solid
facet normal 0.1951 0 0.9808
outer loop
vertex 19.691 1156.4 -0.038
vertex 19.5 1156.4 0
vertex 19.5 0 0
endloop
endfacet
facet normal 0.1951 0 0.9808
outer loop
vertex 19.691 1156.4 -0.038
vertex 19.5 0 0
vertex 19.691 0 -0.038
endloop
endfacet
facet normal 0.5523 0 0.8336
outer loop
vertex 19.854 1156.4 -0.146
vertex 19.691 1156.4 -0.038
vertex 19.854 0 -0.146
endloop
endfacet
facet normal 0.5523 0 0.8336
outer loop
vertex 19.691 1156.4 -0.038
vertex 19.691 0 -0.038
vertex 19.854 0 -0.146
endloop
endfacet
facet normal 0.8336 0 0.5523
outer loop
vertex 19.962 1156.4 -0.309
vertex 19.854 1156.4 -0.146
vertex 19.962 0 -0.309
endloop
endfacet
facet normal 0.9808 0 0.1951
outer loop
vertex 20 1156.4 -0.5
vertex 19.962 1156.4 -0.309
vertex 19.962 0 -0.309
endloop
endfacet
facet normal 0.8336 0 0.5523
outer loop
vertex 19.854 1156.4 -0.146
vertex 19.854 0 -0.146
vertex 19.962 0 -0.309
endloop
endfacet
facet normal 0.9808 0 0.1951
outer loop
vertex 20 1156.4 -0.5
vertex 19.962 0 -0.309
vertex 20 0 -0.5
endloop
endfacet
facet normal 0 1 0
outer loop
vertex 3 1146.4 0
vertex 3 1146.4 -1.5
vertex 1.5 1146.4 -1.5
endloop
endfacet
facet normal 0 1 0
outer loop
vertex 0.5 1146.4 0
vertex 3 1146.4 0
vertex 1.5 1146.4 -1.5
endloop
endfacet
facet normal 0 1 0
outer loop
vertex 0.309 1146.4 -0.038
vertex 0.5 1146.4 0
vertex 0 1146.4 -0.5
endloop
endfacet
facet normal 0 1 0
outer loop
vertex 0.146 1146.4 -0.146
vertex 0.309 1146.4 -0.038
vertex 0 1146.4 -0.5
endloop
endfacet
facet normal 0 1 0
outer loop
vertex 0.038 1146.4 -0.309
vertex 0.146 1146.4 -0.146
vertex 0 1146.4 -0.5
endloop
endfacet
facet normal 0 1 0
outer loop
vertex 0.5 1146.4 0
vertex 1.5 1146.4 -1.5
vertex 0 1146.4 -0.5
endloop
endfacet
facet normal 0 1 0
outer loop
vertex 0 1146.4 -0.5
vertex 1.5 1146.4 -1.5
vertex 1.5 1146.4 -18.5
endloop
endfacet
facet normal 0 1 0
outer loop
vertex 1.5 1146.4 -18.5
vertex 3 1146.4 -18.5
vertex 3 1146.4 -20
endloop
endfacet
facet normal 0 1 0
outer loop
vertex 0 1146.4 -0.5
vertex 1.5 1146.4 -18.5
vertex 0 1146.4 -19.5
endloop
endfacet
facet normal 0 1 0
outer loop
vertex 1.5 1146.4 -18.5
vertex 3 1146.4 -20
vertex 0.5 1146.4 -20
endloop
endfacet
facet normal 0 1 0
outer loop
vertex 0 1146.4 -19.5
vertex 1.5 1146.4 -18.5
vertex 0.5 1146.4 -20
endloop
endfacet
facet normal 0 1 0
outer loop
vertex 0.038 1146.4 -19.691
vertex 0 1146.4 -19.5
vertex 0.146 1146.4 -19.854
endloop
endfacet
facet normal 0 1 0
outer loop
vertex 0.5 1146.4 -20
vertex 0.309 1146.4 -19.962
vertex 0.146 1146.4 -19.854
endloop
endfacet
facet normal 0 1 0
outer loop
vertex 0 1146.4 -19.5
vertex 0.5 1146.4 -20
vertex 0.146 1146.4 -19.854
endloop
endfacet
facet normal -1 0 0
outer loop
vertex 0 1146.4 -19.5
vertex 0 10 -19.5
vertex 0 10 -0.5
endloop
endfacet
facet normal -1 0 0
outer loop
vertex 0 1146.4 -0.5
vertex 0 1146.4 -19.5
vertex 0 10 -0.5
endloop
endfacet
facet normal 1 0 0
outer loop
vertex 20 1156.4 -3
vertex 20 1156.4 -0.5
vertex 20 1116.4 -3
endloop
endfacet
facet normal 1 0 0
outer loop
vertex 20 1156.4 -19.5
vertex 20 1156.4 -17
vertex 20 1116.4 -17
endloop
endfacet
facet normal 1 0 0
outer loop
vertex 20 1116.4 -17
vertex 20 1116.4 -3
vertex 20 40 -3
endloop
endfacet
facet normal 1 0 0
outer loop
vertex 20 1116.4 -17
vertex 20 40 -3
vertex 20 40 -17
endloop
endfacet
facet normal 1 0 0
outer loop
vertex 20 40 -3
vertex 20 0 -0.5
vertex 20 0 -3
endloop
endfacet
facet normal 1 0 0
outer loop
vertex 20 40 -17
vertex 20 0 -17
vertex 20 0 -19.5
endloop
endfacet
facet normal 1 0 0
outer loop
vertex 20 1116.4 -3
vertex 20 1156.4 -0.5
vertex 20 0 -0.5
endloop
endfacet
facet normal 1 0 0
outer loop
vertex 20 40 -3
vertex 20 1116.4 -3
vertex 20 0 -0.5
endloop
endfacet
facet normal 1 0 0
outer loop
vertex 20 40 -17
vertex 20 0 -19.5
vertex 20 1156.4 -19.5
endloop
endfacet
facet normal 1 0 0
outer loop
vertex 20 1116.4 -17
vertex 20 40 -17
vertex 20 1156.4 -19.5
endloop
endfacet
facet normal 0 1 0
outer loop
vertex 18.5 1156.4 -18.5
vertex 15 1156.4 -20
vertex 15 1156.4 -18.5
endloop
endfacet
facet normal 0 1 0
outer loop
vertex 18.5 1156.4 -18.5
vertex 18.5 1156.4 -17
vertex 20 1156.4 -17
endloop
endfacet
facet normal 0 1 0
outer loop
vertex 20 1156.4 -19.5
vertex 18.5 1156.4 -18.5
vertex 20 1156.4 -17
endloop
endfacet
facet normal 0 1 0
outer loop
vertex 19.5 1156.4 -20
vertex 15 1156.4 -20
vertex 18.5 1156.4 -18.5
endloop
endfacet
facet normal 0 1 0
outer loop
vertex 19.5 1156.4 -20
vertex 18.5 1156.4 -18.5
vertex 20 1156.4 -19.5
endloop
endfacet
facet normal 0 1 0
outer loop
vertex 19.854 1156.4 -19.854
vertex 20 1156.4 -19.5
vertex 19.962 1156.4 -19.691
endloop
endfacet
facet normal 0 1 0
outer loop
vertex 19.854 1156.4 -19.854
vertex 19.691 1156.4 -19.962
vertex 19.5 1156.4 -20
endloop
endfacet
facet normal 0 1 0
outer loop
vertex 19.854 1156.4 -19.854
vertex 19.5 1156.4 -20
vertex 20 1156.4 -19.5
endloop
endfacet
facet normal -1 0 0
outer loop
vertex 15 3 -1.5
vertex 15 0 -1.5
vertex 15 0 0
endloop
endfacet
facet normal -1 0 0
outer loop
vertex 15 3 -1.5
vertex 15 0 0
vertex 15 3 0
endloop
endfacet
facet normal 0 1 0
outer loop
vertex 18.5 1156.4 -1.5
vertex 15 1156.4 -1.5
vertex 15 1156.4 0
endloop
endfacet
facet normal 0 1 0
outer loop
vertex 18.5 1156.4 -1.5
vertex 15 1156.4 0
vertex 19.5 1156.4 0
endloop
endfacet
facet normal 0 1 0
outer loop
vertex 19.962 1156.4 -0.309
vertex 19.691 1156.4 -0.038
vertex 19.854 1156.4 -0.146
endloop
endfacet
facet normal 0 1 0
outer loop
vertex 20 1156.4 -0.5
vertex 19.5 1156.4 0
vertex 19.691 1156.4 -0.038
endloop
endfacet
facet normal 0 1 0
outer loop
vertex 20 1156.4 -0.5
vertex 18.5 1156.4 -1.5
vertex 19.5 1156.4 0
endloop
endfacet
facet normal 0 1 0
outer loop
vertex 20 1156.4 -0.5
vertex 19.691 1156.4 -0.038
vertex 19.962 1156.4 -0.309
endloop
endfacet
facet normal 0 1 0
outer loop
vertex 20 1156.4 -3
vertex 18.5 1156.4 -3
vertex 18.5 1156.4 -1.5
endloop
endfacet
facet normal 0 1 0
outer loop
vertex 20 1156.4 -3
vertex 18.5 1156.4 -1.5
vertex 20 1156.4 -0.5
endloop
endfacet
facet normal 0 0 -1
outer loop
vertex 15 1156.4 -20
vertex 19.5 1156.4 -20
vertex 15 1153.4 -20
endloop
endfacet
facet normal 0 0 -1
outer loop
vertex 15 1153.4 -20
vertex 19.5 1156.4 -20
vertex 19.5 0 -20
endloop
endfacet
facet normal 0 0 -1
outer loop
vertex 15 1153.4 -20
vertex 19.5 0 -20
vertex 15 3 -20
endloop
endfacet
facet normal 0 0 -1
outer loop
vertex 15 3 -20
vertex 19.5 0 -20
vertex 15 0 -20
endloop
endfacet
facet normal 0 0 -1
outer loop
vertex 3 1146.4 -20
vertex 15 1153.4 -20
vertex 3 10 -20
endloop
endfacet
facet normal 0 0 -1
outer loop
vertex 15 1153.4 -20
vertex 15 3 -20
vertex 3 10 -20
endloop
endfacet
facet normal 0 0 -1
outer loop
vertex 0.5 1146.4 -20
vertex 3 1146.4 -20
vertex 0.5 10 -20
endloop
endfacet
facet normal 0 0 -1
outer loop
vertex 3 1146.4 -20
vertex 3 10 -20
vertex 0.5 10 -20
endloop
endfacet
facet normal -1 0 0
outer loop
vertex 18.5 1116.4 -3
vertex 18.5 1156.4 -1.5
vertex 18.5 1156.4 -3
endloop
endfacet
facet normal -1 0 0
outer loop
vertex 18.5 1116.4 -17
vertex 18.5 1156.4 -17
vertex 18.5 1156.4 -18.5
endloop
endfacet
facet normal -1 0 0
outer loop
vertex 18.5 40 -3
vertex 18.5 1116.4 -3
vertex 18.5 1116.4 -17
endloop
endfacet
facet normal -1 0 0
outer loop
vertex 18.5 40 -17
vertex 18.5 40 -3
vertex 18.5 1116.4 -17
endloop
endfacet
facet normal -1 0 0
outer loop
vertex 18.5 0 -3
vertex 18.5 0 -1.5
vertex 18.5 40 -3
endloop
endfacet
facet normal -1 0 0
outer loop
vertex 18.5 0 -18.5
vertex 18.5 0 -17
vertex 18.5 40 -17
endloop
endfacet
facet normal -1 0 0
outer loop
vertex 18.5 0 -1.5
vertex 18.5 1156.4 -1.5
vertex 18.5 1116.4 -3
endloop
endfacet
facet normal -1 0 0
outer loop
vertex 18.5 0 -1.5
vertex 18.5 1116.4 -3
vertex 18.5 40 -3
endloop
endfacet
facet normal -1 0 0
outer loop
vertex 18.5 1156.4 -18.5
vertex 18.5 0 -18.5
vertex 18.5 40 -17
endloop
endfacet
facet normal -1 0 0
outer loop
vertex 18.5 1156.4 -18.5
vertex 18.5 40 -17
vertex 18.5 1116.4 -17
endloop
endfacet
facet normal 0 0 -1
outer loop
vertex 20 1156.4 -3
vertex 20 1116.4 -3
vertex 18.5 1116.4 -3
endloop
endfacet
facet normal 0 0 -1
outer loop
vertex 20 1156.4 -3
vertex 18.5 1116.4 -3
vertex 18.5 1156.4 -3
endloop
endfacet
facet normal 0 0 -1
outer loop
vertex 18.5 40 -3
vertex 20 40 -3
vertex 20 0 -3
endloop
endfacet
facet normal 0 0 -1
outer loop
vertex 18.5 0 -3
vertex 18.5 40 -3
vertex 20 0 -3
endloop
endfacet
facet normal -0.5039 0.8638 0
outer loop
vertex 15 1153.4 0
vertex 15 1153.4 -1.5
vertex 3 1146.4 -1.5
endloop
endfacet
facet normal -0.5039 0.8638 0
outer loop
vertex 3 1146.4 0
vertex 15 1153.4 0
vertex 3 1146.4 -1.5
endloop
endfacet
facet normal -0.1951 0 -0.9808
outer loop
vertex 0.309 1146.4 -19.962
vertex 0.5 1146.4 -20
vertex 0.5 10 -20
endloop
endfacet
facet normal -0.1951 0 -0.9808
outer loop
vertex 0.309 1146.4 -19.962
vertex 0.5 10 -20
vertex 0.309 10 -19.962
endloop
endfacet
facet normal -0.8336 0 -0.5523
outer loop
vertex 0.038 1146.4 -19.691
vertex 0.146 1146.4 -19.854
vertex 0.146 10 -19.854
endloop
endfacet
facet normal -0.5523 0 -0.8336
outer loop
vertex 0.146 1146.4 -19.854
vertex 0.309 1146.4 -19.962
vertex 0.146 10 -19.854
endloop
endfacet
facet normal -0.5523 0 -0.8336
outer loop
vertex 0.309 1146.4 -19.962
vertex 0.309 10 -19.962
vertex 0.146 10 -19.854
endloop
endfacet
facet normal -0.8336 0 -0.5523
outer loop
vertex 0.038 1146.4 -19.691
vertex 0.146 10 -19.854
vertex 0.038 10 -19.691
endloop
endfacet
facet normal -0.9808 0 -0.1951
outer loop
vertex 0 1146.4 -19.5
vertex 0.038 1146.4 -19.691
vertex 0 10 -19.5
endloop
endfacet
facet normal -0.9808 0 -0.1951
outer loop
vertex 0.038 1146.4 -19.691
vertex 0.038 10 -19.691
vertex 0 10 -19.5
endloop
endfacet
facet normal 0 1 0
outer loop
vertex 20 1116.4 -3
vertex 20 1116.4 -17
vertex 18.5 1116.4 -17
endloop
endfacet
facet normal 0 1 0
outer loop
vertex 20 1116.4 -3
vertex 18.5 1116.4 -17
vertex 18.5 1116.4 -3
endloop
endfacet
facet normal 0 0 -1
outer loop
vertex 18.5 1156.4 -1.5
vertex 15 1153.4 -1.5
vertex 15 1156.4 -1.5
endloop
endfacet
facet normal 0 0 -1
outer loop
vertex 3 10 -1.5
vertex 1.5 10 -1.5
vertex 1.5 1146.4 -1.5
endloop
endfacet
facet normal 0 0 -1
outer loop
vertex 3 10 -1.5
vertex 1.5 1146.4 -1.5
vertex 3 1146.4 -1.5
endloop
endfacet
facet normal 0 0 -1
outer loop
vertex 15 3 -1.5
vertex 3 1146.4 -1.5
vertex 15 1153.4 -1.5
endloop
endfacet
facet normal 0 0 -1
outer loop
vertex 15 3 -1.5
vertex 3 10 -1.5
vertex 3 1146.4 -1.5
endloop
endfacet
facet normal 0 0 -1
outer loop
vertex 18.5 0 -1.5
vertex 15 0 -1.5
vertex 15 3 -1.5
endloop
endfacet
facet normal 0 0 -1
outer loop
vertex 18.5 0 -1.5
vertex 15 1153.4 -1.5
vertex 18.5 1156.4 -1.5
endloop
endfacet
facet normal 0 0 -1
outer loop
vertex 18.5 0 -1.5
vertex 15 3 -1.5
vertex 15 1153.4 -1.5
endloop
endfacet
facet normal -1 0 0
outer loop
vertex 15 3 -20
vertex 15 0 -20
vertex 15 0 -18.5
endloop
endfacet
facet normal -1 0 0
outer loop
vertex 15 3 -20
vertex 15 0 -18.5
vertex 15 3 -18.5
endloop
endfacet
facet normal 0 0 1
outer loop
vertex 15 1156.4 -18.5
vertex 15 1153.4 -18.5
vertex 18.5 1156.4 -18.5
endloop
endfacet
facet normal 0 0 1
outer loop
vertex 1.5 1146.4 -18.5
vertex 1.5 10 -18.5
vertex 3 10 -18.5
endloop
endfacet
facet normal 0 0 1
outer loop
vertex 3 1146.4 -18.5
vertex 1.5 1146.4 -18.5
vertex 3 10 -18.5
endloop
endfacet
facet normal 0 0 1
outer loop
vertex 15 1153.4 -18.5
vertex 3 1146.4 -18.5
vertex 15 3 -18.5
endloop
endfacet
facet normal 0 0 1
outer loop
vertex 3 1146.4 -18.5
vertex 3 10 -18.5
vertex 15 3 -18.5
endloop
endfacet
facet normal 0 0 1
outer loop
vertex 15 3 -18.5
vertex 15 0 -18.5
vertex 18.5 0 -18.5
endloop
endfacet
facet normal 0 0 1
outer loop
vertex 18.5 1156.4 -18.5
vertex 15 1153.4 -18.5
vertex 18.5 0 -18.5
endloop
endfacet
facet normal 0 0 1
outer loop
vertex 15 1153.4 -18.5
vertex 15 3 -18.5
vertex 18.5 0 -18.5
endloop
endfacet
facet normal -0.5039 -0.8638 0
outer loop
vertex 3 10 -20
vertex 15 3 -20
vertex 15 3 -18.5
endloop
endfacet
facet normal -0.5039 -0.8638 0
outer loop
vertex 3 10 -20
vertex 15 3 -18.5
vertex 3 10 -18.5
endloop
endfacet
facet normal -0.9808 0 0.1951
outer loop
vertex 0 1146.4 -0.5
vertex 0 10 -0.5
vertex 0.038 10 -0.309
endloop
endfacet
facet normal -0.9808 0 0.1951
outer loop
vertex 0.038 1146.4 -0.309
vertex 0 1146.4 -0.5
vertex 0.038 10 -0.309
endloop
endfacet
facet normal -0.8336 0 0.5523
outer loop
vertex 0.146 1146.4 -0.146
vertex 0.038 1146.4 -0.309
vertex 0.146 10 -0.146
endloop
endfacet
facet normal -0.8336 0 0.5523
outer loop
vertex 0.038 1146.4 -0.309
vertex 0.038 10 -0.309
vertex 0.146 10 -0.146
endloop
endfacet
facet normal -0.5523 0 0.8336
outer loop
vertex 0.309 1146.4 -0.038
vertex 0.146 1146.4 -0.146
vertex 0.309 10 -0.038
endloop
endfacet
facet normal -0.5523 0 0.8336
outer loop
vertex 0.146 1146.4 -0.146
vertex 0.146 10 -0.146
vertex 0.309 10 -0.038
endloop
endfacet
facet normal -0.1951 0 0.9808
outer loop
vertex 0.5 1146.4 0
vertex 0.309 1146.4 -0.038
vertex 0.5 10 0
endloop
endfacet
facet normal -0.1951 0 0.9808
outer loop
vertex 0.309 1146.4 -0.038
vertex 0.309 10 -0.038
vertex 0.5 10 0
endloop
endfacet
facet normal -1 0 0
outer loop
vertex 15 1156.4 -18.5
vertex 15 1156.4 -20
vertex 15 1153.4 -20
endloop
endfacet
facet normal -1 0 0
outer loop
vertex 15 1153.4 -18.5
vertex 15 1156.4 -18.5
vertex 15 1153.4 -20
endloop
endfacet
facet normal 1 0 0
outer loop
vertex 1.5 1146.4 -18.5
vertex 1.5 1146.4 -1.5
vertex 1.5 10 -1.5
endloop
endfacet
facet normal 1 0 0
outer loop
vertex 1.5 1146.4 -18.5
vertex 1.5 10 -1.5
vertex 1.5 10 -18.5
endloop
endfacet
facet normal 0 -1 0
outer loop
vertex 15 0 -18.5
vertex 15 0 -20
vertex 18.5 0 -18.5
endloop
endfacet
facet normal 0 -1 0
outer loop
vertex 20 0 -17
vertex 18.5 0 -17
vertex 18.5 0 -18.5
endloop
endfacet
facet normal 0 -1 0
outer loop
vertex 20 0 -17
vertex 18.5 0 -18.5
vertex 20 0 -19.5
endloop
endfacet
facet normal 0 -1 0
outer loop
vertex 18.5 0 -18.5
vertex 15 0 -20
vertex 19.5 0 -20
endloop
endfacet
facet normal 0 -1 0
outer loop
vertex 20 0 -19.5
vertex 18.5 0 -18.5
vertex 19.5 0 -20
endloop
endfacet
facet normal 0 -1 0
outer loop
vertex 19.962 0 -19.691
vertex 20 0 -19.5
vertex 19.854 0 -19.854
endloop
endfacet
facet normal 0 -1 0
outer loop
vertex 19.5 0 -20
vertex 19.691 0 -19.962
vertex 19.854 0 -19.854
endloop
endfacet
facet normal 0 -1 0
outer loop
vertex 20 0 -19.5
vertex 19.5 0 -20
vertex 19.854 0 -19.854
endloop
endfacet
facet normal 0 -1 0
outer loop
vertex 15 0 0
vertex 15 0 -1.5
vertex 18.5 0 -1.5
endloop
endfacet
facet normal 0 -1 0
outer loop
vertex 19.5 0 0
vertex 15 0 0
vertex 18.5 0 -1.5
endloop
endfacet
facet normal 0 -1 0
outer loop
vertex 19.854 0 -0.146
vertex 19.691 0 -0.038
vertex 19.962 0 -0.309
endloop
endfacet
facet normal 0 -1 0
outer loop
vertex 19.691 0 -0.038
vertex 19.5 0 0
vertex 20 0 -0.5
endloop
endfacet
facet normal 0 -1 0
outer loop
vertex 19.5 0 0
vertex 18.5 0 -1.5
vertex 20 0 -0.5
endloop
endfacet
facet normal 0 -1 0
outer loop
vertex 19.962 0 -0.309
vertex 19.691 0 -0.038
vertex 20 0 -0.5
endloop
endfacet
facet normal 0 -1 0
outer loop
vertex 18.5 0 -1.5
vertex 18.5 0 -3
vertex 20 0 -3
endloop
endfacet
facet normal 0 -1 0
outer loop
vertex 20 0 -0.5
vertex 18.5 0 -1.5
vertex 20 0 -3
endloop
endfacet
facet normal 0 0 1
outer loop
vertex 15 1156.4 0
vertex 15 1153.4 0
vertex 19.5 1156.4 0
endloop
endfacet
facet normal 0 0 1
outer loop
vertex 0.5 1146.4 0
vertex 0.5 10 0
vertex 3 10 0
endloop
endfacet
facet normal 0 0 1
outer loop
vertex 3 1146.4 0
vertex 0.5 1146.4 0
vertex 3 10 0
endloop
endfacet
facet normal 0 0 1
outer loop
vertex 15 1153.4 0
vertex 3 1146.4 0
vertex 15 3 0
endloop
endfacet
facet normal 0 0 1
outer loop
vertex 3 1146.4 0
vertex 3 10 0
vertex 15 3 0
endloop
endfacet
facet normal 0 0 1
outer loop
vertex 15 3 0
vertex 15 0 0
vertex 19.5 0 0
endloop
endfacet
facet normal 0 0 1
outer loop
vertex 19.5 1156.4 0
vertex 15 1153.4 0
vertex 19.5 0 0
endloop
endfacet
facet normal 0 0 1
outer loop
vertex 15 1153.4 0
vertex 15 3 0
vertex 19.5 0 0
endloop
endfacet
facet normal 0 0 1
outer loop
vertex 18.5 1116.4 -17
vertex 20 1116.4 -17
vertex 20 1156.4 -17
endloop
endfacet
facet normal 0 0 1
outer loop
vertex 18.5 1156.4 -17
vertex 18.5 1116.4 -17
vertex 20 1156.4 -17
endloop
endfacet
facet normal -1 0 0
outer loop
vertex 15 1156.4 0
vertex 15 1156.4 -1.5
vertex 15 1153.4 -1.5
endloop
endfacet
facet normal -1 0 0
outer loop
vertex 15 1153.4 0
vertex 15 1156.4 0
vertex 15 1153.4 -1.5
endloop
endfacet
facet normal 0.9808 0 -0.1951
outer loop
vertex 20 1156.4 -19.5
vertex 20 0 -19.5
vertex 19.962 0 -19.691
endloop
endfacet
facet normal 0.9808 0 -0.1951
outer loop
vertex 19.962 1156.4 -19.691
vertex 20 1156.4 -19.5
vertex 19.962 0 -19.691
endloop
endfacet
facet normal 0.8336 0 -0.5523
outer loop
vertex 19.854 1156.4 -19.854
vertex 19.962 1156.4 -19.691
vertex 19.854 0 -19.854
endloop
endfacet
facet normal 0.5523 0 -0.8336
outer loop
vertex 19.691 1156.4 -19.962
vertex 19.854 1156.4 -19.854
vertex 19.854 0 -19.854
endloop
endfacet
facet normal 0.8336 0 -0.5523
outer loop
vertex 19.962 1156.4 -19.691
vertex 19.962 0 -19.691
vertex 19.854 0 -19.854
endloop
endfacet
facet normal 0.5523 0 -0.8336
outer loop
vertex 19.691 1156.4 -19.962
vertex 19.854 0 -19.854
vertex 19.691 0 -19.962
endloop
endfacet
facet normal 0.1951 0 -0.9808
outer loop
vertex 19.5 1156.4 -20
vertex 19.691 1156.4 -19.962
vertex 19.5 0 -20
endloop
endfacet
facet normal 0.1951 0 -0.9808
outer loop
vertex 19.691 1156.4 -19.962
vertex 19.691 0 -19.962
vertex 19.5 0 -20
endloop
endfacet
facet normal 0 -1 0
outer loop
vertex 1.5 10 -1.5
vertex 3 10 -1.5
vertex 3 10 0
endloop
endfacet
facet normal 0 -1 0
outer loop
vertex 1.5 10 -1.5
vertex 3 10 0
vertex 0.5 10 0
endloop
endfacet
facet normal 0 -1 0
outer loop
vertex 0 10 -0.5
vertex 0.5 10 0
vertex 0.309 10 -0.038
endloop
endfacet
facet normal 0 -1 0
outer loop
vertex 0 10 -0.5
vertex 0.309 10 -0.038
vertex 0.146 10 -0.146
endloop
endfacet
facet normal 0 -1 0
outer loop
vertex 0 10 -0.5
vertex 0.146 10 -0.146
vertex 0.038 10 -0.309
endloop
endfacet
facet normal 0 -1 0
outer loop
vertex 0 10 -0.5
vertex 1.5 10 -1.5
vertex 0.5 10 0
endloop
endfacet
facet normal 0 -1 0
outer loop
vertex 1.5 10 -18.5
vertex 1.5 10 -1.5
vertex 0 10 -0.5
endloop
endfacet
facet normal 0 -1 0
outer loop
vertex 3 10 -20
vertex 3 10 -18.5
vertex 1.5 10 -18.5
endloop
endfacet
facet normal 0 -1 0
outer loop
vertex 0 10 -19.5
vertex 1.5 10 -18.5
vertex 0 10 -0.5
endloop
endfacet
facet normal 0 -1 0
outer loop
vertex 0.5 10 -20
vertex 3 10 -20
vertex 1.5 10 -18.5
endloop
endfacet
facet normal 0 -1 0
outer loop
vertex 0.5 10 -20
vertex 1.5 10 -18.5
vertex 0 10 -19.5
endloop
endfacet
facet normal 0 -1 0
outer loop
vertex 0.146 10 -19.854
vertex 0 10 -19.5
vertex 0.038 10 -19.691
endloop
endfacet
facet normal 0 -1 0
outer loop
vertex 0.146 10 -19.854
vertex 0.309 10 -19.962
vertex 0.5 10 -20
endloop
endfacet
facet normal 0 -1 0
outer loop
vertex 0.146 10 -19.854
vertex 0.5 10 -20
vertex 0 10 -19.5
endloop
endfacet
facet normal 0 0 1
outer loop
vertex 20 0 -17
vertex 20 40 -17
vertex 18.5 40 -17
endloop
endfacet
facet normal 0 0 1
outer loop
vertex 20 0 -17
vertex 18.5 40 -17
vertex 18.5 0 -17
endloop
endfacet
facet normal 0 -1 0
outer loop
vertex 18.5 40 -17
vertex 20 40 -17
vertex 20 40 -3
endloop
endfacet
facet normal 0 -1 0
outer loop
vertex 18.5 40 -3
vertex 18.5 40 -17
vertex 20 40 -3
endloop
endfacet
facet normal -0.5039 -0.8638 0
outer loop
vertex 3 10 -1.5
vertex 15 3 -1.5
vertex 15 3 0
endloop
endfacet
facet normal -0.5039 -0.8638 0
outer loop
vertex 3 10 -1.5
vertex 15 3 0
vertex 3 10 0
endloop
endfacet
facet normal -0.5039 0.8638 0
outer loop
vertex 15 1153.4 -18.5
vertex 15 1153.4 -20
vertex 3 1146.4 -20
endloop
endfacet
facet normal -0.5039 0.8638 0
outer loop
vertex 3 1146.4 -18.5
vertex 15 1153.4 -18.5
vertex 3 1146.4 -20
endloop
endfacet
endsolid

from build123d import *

# Parameters (mm, degrees)
SKETCH1_W           = 17
SKETCH1_H           = 17
BOSS_EXTRUDE1_DEPTH = 1156.4
CUT_EXTRUDE4_START  = -20
SKETCH5_W           = 14
SKETCH5_H           = 40
CUT_EXTRUDE4_DEPTH  = 10
CUT_EXTRUDE5_DEPTH  = 1157.745849355


with BuildPart() as part:
    # Sketch1 → Boss-Extrude1 (new body)
    with BuildSketch(Plane(origin=(0, 0, 0), x_dir=(1, 0, 0), z_dir=(0, 1, 0))):
        with BuildLine():
            Line((0.5, 0), (19.5, 0))
            ThreePointArc((19.5, 0), (19.853553391, 0.146446609), (20, 0.5))
            Line((20, 0.5), (20, 19.5))
            ThreePointArc((20, 19.5), (19.853553391, 19.853553391), (19.5, 20))
            Line((19.5, 20), (0.5, 20))
            ThreePointArc((0.5, 20), (0.146446609, 19.853553391), (0, 19.5))
            Line((0, 19.5), (0, 0.5))
            ThreePointArc((0, 0.5), (0.146446609, 0.146446609), (0.5, 0))
        make_face()
        with Locations((10, 10)):
            Rectangle(SKETCH1_W, SKETCH1_H, mode=Mode.SUBTRACT)
    extrude(amount=BOSS_EXTRUDE1_DEPTH)

    # Sketch5 → Cut-Extrude4 (cut)
    with BuildSketch(Plane.ZY.offset(CUT_EXTRUDE4_START)):
        with Locations((-10, 1136.4)):
            Rectangle(SKETCH5_W, SKETCH5_H)
    cut_extrude4 = extrude(amount=CUT_EXTRUDE4_DEPTH, mode=Mode.SUBTRACT)

    # Sketch6 → Cut-Extrude5 (cut, through all)
    with BuildSketch(Plane(origin=(0, 0, -20), x_dir=(-1, 0, 0), z_dir=(0, 0, -1))):
        Polygon((-15, 1156.4), (-15, 1153.4), (-3, 1146.4), (0, 1146.4), (0, 1156.4), align=None)
    cut_extrude5 = extrude(amount=-CUT_EXTRUDE5_DEPTH, mode=Mode.SUBTRACT)

    # Mirror1: Cut-Extrude4, Cut-Extrude5 across plane
    add(cut_extrude4.mirror(Plane.ZX.offset(578.2)), mode=Mode.SUBTRACT)
    add(cut_extrude5.mirror(Plane.ZX.offset(578.2)), mode=Mode.SUBTRACT)


solid = part.part
